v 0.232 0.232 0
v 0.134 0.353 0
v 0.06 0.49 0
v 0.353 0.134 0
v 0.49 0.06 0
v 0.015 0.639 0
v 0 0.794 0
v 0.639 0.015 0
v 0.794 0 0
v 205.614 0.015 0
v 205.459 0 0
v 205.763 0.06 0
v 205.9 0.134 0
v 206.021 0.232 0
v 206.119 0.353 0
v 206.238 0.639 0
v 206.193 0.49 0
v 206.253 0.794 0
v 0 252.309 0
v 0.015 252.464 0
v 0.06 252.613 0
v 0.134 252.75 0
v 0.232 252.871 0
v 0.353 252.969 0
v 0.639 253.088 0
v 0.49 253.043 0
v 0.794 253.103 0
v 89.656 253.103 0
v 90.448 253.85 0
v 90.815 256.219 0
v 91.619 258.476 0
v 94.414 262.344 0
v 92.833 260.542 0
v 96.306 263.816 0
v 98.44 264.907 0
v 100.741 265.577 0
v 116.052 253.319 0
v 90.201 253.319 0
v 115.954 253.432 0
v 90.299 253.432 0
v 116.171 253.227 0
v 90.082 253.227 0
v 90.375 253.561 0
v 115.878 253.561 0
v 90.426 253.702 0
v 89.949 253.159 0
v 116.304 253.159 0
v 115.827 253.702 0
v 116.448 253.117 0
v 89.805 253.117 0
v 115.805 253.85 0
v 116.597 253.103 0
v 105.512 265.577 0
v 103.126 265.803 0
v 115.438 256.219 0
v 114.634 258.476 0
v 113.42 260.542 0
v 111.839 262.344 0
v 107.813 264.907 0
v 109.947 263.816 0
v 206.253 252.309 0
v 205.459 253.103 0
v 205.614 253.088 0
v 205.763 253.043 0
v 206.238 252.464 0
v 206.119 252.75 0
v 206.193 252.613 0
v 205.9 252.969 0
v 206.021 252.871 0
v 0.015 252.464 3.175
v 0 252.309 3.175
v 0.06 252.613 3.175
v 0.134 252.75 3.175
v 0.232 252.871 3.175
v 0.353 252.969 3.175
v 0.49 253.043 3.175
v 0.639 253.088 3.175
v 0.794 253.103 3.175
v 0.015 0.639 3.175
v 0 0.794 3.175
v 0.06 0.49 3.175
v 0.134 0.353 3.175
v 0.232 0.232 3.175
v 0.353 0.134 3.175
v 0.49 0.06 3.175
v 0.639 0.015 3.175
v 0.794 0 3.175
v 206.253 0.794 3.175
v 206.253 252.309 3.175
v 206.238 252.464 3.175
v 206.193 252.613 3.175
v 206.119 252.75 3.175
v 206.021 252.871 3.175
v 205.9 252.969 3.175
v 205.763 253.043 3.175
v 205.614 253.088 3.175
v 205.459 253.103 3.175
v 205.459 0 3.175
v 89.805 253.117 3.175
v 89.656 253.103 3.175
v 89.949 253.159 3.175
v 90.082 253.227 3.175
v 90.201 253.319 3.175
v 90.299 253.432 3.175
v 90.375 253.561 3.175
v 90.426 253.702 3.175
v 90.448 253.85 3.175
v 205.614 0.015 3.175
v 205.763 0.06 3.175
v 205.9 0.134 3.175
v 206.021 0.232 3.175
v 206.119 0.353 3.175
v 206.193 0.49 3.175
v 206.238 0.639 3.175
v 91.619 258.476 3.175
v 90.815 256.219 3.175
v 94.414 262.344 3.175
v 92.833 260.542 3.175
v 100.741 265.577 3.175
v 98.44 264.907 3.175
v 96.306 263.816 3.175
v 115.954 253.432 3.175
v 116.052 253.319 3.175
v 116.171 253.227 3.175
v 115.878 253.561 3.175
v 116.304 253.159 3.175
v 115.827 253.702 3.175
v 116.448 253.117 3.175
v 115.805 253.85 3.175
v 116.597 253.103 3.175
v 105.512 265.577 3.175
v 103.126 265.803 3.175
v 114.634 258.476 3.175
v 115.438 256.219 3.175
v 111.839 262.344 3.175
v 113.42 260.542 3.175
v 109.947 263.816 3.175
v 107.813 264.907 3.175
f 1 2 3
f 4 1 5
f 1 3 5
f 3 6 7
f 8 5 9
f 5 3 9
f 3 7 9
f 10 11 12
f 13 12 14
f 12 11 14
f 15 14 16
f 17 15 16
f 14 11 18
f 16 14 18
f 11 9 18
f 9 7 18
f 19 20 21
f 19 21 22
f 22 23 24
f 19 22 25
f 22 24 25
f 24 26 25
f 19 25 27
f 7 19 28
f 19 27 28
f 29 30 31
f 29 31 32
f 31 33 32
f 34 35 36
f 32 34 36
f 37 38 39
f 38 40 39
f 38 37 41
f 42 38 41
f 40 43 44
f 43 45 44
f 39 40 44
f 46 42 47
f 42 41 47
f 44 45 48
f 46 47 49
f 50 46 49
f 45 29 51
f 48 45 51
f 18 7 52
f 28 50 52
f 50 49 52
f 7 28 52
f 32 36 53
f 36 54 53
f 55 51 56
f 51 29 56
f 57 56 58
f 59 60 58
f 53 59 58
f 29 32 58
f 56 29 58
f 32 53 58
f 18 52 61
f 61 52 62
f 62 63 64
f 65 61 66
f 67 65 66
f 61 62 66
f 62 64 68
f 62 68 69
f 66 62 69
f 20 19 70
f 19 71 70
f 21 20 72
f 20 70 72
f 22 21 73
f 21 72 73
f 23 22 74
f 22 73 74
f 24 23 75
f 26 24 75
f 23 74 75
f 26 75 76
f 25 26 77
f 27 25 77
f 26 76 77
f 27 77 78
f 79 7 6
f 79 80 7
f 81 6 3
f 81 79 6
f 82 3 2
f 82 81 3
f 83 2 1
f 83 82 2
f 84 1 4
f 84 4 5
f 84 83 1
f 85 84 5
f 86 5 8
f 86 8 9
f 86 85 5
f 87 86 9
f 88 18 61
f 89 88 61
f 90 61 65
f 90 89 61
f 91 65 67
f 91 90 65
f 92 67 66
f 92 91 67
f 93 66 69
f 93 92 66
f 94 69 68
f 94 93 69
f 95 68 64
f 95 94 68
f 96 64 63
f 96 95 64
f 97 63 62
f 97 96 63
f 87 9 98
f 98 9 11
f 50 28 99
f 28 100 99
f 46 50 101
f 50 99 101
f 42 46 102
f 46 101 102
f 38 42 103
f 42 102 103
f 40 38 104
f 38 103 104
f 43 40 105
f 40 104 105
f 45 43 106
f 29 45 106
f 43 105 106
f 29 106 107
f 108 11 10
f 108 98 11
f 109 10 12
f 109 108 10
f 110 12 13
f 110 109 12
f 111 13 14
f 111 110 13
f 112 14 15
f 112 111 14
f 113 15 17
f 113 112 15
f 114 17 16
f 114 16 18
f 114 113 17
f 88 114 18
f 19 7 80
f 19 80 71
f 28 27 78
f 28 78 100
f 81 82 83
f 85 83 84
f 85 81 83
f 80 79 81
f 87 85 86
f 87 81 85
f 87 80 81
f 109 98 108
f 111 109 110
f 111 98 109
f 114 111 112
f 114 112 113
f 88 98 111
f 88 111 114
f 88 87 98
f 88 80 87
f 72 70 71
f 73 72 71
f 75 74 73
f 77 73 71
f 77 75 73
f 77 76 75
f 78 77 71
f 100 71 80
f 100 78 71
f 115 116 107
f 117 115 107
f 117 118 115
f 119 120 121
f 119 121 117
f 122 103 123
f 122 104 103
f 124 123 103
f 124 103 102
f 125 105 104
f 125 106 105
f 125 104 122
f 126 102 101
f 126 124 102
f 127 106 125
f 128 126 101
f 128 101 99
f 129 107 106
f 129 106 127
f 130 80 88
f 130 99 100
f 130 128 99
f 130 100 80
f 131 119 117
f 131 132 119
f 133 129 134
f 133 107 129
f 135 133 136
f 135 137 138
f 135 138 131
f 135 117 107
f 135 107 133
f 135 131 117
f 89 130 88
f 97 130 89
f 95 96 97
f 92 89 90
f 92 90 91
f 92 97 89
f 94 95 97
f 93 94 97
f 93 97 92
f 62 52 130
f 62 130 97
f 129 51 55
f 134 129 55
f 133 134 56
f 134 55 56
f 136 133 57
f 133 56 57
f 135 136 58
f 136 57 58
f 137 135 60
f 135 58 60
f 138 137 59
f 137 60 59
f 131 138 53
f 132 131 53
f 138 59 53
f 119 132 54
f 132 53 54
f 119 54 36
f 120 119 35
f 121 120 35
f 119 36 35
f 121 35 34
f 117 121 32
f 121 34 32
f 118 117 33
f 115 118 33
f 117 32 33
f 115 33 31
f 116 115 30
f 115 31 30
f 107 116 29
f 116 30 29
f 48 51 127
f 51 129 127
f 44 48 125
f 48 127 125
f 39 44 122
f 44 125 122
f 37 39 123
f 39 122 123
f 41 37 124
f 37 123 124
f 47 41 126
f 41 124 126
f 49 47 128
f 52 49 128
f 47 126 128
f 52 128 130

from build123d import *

# Parameters (mm, degrees)
SKETCH1_W           = 206.253
SKETCH1_H           = 253.103
BOSS_EXTRUDE1_DEPTH = 3.175
BOSS_EXTRUDE3_DEPTH = 3.175
FILLET1_R           = 0.79375


with BuildPart() as part:
    # Sketch1 → Boss-Extrude1 (new body)
    with BuildSketch(Plane.XY):
        with Locations((103.1265, 126.5515)):
            Rectangle(SKETCH1_W, SKETCH1_H)
    extrude(amount=BOSS_EXTRUDE1_DEPTH)

    # Sketch3 → Boss-Extrude3 (add)
    with BuildSketch(Plane.XY):
        with BuildLine():
            Line((90.4265, 253.103), (115.8265, 253.103))
            ThreePointArc((115.8265, 253.103), (103.1265, 265.803), (90.4265, 253.103))
        make_face()
    extrude(amount=BOSS_EXTRUDE3_DEPTH)

    # Fillet1
    fillet1_edges = [part.edges().sort_by_distance(p)[0] for p in [
        (115.8265, 253.103, 1.5875),
        (90.4265, 253.103, 1.5875),
        (0, 253.103, 1.5875),
        (206.253, 253.103, 1.5875),
        (206.253, 0, 1.5875),
        (0, 0, 1.5875),
    ]]
    fillet(fillet1_edges, radius=FILLET1_R)


solid = part.part
